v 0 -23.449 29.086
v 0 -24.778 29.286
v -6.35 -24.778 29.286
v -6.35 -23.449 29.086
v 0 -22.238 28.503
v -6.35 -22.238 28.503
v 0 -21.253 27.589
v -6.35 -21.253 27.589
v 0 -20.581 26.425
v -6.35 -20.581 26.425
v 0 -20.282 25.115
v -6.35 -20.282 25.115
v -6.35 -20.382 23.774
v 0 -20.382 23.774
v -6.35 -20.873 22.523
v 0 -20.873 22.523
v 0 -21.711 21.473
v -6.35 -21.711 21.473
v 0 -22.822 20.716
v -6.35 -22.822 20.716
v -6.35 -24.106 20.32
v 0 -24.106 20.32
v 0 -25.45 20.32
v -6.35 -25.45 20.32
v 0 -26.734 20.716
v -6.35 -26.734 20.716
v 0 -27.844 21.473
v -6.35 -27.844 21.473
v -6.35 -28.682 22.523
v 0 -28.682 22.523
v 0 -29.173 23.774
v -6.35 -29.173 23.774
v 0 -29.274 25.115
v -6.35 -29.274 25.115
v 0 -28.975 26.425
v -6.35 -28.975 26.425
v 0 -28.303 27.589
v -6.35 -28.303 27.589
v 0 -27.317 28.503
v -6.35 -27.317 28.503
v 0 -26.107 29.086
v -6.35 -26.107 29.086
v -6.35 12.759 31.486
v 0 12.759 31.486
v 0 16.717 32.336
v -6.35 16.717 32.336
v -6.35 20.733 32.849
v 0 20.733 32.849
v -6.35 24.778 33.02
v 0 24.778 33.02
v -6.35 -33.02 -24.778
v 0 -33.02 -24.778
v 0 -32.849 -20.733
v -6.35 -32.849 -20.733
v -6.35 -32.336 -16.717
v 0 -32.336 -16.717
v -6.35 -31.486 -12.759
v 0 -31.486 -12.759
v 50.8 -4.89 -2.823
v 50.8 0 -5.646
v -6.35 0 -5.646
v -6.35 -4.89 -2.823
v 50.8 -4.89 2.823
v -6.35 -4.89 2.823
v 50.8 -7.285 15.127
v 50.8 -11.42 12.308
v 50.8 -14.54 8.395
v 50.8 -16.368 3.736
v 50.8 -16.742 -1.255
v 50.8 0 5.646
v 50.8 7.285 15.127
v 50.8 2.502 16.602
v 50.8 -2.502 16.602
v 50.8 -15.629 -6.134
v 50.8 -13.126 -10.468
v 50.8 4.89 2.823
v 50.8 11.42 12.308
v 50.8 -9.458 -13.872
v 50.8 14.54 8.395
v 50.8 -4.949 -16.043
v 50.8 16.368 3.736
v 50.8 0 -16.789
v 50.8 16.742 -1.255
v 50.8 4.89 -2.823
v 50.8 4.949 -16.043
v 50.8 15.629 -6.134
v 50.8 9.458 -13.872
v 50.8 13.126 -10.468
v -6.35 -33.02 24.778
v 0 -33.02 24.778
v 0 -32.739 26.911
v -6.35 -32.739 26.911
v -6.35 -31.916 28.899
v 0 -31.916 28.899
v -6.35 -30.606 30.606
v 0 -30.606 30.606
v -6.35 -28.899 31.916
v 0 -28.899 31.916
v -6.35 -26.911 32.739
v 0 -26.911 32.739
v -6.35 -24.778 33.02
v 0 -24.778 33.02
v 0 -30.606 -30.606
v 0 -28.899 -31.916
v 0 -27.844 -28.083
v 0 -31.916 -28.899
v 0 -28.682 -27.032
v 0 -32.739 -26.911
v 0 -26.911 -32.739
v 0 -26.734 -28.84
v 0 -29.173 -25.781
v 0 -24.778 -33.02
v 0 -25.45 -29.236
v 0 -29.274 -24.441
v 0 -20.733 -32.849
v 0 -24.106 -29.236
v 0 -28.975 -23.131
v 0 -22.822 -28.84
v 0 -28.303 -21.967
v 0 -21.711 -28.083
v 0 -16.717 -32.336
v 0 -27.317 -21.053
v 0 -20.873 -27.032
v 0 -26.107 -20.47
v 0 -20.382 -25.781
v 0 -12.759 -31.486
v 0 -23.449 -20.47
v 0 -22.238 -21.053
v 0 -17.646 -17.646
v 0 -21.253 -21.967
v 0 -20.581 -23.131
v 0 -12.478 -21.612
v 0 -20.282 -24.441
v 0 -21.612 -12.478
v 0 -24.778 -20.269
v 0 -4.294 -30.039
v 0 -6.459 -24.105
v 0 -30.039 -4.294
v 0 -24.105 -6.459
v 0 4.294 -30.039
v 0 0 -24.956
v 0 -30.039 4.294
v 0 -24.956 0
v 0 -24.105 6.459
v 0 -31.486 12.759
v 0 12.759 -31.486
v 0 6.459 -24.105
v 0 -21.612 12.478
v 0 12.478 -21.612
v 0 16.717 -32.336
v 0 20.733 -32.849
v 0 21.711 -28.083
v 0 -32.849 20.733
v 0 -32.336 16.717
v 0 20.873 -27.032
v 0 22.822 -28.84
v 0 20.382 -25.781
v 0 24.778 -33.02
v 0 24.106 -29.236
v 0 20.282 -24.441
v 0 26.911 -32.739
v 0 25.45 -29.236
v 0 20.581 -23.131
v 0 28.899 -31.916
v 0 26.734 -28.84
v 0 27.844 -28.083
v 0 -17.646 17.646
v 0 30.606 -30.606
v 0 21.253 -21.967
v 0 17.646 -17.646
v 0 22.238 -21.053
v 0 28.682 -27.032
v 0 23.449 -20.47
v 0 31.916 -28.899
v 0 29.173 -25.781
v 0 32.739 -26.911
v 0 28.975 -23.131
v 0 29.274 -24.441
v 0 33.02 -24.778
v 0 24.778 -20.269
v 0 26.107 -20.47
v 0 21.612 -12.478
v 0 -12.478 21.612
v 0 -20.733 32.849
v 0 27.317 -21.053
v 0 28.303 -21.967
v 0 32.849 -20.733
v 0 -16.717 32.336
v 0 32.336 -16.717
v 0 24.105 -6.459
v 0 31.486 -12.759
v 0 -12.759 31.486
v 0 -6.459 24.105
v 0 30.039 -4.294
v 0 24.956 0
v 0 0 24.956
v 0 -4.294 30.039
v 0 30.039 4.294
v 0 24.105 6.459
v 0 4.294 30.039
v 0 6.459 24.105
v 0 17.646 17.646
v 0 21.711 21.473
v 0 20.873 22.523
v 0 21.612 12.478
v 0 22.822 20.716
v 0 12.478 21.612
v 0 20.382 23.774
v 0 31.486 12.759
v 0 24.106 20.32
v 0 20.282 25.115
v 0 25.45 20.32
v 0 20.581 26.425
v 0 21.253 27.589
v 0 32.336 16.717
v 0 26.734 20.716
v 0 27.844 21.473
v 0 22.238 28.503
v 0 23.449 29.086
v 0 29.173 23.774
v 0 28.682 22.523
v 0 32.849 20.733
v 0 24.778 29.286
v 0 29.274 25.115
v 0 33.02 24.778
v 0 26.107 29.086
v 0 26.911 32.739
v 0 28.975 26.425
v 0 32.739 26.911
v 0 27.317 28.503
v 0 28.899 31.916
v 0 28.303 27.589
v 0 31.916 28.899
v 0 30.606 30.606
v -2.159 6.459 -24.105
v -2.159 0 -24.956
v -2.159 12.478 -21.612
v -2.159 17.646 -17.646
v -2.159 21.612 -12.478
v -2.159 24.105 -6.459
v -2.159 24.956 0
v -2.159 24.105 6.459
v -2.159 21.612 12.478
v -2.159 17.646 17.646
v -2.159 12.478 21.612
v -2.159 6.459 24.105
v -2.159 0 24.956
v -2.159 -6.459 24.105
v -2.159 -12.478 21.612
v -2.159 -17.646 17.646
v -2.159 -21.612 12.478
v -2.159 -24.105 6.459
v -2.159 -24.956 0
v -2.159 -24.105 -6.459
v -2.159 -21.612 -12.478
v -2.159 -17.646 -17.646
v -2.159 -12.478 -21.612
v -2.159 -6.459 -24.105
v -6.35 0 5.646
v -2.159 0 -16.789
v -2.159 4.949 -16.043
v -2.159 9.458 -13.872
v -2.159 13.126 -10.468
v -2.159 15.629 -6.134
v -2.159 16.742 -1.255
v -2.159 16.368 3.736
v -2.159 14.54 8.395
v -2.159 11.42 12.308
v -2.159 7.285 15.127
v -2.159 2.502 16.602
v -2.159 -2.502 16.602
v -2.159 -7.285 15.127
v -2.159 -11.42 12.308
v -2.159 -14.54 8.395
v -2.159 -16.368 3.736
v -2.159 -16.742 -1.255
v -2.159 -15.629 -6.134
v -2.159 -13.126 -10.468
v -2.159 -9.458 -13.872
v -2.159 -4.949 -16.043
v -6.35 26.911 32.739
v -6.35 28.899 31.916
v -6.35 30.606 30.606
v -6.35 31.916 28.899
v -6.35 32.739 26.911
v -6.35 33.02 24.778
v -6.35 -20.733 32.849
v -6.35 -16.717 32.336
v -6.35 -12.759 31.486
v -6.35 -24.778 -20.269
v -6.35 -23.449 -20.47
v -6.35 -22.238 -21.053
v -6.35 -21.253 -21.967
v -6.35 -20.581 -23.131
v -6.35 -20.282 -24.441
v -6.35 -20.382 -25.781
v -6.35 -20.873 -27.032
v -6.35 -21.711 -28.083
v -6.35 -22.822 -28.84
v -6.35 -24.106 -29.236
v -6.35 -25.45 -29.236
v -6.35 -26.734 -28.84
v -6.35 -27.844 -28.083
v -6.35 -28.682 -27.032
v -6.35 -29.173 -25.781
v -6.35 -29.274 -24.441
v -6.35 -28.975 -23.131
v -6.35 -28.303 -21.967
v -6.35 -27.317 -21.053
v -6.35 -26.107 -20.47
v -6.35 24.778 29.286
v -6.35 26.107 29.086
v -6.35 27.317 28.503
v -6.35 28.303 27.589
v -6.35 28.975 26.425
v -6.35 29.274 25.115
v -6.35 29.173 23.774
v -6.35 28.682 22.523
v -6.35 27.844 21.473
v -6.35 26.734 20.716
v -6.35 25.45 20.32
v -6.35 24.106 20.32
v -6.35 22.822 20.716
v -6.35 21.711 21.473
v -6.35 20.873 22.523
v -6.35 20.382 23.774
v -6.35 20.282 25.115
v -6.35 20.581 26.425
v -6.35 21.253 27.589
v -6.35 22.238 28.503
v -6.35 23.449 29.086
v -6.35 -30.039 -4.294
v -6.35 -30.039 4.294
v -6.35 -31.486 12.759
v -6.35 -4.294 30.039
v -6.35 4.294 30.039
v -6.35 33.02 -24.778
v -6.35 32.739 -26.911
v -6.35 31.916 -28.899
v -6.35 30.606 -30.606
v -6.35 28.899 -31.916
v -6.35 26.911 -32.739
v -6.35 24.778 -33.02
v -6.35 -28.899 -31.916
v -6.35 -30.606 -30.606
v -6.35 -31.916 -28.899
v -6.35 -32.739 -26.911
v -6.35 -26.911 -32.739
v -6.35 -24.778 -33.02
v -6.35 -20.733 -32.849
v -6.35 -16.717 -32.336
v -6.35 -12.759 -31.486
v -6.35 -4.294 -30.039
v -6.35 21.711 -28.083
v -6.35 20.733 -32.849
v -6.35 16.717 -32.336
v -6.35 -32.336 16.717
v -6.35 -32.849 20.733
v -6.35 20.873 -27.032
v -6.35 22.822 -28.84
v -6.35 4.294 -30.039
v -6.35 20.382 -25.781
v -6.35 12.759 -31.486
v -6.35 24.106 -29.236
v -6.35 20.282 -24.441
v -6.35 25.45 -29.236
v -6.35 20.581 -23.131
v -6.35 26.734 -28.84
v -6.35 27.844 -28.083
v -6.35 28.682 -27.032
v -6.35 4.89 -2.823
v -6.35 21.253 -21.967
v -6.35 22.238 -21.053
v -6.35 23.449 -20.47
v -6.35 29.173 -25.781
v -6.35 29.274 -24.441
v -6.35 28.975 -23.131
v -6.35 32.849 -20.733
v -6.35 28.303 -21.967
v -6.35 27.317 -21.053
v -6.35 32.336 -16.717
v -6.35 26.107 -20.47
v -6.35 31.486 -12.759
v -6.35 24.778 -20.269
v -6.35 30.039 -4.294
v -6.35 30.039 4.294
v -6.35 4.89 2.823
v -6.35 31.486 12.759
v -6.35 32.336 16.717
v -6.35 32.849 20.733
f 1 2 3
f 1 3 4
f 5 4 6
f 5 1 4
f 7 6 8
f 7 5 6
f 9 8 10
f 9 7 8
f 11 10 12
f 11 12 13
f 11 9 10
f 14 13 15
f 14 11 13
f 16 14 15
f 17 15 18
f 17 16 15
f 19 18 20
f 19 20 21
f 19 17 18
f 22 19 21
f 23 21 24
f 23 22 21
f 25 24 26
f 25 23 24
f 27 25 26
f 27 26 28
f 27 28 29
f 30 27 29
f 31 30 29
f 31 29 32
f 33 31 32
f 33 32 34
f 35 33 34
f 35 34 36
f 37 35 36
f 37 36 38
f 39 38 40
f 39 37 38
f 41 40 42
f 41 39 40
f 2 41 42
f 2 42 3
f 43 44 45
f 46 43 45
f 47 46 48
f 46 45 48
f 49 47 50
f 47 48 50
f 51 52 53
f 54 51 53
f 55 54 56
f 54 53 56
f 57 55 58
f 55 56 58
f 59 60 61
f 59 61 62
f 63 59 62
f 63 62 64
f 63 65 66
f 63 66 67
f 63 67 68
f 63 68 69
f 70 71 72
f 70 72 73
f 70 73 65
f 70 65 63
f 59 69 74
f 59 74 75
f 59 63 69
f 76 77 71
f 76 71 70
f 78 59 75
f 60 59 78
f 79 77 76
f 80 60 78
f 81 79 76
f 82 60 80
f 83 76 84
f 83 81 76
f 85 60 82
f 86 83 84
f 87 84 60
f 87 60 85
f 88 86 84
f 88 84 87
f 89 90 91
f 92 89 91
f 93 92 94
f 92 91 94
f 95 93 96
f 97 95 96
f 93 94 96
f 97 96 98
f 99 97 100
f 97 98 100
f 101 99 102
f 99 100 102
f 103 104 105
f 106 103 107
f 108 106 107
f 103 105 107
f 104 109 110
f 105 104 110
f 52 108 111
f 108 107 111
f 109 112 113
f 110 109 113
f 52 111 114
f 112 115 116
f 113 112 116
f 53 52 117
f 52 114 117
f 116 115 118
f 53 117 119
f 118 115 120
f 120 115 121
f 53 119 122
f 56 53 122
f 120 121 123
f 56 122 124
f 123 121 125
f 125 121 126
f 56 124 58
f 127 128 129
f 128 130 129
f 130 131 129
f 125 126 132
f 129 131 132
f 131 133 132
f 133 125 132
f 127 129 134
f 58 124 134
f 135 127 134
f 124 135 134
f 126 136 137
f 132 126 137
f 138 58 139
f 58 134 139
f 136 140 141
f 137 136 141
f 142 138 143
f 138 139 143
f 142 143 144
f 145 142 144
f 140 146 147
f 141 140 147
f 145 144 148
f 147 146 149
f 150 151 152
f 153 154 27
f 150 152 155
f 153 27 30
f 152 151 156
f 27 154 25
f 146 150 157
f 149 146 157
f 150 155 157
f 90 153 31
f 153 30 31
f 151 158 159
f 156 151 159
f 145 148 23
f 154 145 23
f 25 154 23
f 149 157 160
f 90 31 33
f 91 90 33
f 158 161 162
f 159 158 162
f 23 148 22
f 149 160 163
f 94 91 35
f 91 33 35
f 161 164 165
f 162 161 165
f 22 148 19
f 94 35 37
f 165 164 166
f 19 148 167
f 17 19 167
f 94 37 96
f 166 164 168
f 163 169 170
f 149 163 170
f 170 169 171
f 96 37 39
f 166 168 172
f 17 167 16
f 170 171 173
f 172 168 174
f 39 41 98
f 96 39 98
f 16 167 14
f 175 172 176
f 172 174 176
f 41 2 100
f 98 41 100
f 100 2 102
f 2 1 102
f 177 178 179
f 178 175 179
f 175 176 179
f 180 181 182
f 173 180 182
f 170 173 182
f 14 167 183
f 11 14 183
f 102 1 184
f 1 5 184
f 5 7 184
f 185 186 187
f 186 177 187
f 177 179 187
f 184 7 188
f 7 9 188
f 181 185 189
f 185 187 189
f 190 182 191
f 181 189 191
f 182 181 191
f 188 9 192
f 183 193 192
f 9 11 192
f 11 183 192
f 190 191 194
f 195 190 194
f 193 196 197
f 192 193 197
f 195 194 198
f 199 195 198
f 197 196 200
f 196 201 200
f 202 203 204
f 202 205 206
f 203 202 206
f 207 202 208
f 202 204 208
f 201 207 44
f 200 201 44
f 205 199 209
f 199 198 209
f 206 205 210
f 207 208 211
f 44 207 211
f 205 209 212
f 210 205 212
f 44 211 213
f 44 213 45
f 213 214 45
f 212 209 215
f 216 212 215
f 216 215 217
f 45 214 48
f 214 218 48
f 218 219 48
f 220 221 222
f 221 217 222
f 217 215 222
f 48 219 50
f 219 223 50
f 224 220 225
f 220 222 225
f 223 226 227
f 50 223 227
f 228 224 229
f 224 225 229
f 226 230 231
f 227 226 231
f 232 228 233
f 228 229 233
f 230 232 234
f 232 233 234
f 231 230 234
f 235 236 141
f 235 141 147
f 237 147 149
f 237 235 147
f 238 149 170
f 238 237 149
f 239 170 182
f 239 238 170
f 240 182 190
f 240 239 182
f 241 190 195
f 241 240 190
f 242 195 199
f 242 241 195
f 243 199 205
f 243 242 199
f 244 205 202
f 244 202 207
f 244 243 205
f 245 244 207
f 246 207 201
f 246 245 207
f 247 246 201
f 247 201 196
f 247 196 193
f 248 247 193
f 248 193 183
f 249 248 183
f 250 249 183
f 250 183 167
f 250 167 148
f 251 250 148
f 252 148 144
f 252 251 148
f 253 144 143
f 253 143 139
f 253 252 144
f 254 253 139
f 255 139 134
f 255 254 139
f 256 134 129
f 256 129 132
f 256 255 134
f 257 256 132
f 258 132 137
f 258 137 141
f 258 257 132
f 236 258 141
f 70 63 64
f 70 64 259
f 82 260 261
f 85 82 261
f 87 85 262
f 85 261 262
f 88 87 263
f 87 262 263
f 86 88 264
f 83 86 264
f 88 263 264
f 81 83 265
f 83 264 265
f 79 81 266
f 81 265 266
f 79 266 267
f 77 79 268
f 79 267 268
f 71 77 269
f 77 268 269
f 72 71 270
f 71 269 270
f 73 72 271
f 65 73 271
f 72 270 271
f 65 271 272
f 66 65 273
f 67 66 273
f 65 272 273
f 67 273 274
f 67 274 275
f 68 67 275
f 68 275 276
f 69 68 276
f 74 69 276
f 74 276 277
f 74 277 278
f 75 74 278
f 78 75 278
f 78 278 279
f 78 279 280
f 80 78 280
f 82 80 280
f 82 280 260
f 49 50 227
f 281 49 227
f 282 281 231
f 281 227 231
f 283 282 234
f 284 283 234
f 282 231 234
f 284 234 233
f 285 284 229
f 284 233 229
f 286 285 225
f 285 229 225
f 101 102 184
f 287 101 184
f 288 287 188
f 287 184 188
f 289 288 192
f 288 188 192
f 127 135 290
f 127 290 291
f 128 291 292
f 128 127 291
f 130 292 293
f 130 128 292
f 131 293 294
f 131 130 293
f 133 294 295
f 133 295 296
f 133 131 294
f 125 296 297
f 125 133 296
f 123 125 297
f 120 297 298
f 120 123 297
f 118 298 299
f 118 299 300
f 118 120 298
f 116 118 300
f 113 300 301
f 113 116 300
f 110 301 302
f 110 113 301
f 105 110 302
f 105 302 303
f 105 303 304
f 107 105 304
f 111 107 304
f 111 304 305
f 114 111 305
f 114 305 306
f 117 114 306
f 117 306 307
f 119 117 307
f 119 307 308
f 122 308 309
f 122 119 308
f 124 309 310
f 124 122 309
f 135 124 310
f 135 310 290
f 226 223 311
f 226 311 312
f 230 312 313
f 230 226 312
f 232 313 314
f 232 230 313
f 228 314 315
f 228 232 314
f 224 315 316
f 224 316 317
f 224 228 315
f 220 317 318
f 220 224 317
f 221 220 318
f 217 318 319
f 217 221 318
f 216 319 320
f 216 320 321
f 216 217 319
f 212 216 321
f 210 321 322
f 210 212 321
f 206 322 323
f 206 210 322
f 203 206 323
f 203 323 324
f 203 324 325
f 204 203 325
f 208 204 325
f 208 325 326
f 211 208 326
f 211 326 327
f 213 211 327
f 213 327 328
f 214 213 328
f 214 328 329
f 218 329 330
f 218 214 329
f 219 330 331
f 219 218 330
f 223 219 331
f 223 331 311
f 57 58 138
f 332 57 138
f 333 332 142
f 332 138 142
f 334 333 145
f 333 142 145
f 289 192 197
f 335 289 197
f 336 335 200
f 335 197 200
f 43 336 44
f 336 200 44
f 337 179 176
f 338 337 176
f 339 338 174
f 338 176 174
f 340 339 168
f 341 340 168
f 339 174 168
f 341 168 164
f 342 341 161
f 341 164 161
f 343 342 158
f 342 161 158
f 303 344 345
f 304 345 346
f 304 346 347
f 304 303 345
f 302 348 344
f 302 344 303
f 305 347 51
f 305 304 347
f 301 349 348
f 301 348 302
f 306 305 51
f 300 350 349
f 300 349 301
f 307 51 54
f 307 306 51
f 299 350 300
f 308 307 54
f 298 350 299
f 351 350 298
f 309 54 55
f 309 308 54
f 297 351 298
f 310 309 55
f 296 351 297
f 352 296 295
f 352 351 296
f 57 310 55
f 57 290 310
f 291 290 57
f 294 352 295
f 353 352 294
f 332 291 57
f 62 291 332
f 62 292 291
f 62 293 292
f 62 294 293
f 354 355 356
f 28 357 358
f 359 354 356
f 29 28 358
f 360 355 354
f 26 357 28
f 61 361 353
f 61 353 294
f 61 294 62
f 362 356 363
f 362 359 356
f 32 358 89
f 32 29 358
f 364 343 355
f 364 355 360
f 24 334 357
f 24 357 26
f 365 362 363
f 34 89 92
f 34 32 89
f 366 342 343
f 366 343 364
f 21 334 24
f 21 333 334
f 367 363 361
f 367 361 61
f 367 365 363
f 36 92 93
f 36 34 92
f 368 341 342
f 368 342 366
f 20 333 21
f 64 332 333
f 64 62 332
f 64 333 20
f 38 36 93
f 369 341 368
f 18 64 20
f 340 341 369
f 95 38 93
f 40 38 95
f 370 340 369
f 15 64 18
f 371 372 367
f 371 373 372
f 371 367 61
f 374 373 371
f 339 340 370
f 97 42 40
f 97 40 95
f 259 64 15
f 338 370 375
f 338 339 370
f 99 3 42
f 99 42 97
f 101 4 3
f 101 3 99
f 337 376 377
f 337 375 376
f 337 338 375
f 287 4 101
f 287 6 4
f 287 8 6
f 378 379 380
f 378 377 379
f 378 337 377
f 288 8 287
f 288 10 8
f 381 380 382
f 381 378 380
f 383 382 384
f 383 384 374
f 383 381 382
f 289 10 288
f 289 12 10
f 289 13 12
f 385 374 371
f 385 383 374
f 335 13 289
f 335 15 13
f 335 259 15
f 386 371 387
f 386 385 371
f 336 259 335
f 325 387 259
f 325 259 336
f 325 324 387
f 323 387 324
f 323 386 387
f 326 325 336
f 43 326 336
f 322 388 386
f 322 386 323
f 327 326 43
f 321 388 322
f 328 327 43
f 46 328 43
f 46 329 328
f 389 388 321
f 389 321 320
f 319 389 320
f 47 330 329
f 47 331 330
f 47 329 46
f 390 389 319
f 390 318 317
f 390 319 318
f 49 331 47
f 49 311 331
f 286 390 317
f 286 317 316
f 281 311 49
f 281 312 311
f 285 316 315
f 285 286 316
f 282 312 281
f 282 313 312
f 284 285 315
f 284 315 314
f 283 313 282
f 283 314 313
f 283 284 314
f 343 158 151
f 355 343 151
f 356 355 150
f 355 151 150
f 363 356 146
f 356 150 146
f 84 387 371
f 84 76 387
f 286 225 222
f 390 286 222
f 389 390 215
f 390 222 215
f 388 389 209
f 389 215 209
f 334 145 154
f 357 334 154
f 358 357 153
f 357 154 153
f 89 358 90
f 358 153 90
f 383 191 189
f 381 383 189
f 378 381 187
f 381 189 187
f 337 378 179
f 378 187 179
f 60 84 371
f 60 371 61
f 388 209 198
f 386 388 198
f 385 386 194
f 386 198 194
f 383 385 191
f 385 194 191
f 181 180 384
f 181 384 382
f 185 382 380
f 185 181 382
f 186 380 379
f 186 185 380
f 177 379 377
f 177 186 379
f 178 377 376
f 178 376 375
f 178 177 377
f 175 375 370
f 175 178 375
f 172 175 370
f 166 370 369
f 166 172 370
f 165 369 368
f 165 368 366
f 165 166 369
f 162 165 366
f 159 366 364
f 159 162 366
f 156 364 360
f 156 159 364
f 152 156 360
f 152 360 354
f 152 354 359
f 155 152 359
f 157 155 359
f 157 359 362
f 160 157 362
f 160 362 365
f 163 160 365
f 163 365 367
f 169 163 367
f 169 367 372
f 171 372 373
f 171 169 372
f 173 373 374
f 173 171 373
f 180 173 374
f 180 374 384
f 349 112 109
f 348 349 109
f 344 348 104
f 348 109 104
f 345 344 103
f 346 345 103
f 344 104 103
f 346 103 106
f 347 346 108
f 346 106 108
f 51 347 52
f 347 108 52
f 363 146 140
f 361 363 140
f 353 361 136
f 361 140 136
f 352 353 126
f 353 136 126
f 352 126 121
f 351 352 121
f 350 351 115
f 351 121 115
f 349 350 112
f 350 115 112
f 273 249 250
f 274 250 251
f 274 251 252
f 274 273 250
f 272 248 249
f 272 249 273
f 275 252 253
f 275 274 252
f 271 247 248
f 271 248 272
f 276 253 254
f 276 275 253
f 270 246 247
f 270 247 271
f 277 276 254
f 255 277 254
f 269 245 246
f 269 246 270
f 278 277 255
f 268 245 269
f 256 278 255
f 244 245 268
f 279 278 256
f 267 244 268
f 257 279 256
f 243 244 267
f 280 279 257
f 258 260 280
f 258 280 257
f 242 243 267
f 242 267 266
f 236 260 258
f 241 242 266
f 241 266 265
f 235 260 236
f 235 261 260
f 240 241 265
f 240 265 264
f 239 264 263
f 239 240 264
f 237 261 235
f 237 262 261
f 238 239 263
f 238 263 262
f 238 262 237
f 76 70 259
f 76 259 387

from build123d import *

# Parameters (mm, degrees)
SKETCH1_R           = 16.7894
BOSS_EXTRUDE1_DEPTH = 50.8
SKETCH2_R           = 4.5085
BOSS_EXTRUDE2_DEPTH = 6.35
CUT_EXTRUDE1_START  = -2.159
SKETCH3_R           = 24.9555
SKETCH3_R_2         = 16.7894
CUT_EXTRUDE1_DEPTH  = 2.159


with BuildPart() as part:
    # Sketch1 → Boss-Extrude1 (new body)
    with BuildSketch(Plane(origin=(0, 0, 0), x_dir=(0, 0, -1), z_dir=(1, 0, 0))):
        Circle(SKETCH1_R)
        Polygon((-2.822954141, -4.8895), (2.822954141, -4.8895), (5.645908282, 0), (2.822954141, 4.8895), (-2.822954141, 4.8895), (-5.645908282, 0), align=None, mode=Mode.SUBTRACT)
    extrude(amount=BOSS_EXTRUDE1_DEPTH)

    # Sketch2 → Boss-Extrude2 (add)
    with BuildSketch(Plane.ZY):
        with BuildLine():
            ThreePointArc((-24.7777, 33.02), (-30.605886223, 30.605886223), (-33.02, 24.7777))
            ThreePointArc((-33.02, 24.7777), (-32.634975747, 18.719636617), (-31.48609891, 12.759061339))
            ThreePointArc((-31.48609891, 12.759061339), (-29.8577, 0), (-31.48609891, -12.759061339))
            ThreePointArc((-31.48609891, -12.759061339), (-32.634975747, -18.719636617), (-33.02, -24.7777))
            ThreePointArc((-33.02, -24.7777), (-30.605886223, -30.605886223), (-24.7777, -33.02))
            ThreePointArc((-24.7777, -33.02), (-18.719636617, -32.634975747), (-12.759061339, -31.48609891))
            ThreePointArc((-12.759061339, -31.48609891), (0, -29.8577), (12.759061339, -31.48609891))
            ThreePointArc((12.759061339, -31.48609891), (18.719636617, -32.634975747), (24.7777, -33.02))
            ThreePointArc((24.7777, -33.02), (30.605886223, -30.605886223), (33.02, -24.7777))
            ThreePointArc((33.02, -24.7777), (32.634975747, -18.719636617), (31.48609891, -12.759061339))
            ThreePointArc((31.48609891, -12.759061339), (29.8577, 0), (31.48609891, 12.759061339))
            ThreePointArc((31.48609891, 12.759061339), (32.634975747, 18.719636617), (33.02, 24.7777))
            ThreePointArc((33.02, 24.7777), (30.605886223, 30.605886223), (24.7777, 33.02))
            ThreePointArc((24.7777, 33.02), (18.719636617, 32.634975747), (12.759061339, 31.48609891))
            ThreePointArc((12.759061339, 31.48609891), (0, 29.8577), (-12.759061339, 31.48609891))
            ThreePointArc((-12.759061339, 31.48609891), (-18.719636617, 32.634975747), (-24.7777, 33.02))
        make_face()
        with Locations((24.7777, 24.7777)):
            Circle(SKETCH2_R, mode=Mode.SUBTRACT)
        with Locations((-24.7777, 24.7777)):
            Circle(SKETCH2_R, mode=Mode.SUBTRACT)
        with Locations((-24.7777, -24.7777)):
            Circle(SKETCH2_R, mode=Mode.SUBTRACT)
        with Locations((24.7777, -24.7777)):
            Circle(SKETCH2_R, mode=Mode.SUBTRACT)
        Polygon((2.822954141, 4.8895), (-2.822954141, 4.8895), (-5.645908282, 0), (-2.822954141, -4.8895), (2.822954141, -4.8895), (5.645908282, 0), align=None, mode=Mode.SUBTRACT)
    extrude(amount=BOSS_EXTRUDE2_DEPTH)

    # Sketch3 → Cut-Extrude1 (cut)
    with BuildSketch(Plane(origin=(0, 0, 0), x_dir=(0, 0, -1), z_dir=(1, 0, 0)).offset(CUT_EXTRUDE1_START)):
        Circle(SKETCH3_R)
        Circle(SKETCH3_R_2, mode=Mode.SUBTRACT)
    extrude(amount=CUT_EXTRUDE1_DEPTH, mode=Mode.SUBTRACT)


solid = part.part
